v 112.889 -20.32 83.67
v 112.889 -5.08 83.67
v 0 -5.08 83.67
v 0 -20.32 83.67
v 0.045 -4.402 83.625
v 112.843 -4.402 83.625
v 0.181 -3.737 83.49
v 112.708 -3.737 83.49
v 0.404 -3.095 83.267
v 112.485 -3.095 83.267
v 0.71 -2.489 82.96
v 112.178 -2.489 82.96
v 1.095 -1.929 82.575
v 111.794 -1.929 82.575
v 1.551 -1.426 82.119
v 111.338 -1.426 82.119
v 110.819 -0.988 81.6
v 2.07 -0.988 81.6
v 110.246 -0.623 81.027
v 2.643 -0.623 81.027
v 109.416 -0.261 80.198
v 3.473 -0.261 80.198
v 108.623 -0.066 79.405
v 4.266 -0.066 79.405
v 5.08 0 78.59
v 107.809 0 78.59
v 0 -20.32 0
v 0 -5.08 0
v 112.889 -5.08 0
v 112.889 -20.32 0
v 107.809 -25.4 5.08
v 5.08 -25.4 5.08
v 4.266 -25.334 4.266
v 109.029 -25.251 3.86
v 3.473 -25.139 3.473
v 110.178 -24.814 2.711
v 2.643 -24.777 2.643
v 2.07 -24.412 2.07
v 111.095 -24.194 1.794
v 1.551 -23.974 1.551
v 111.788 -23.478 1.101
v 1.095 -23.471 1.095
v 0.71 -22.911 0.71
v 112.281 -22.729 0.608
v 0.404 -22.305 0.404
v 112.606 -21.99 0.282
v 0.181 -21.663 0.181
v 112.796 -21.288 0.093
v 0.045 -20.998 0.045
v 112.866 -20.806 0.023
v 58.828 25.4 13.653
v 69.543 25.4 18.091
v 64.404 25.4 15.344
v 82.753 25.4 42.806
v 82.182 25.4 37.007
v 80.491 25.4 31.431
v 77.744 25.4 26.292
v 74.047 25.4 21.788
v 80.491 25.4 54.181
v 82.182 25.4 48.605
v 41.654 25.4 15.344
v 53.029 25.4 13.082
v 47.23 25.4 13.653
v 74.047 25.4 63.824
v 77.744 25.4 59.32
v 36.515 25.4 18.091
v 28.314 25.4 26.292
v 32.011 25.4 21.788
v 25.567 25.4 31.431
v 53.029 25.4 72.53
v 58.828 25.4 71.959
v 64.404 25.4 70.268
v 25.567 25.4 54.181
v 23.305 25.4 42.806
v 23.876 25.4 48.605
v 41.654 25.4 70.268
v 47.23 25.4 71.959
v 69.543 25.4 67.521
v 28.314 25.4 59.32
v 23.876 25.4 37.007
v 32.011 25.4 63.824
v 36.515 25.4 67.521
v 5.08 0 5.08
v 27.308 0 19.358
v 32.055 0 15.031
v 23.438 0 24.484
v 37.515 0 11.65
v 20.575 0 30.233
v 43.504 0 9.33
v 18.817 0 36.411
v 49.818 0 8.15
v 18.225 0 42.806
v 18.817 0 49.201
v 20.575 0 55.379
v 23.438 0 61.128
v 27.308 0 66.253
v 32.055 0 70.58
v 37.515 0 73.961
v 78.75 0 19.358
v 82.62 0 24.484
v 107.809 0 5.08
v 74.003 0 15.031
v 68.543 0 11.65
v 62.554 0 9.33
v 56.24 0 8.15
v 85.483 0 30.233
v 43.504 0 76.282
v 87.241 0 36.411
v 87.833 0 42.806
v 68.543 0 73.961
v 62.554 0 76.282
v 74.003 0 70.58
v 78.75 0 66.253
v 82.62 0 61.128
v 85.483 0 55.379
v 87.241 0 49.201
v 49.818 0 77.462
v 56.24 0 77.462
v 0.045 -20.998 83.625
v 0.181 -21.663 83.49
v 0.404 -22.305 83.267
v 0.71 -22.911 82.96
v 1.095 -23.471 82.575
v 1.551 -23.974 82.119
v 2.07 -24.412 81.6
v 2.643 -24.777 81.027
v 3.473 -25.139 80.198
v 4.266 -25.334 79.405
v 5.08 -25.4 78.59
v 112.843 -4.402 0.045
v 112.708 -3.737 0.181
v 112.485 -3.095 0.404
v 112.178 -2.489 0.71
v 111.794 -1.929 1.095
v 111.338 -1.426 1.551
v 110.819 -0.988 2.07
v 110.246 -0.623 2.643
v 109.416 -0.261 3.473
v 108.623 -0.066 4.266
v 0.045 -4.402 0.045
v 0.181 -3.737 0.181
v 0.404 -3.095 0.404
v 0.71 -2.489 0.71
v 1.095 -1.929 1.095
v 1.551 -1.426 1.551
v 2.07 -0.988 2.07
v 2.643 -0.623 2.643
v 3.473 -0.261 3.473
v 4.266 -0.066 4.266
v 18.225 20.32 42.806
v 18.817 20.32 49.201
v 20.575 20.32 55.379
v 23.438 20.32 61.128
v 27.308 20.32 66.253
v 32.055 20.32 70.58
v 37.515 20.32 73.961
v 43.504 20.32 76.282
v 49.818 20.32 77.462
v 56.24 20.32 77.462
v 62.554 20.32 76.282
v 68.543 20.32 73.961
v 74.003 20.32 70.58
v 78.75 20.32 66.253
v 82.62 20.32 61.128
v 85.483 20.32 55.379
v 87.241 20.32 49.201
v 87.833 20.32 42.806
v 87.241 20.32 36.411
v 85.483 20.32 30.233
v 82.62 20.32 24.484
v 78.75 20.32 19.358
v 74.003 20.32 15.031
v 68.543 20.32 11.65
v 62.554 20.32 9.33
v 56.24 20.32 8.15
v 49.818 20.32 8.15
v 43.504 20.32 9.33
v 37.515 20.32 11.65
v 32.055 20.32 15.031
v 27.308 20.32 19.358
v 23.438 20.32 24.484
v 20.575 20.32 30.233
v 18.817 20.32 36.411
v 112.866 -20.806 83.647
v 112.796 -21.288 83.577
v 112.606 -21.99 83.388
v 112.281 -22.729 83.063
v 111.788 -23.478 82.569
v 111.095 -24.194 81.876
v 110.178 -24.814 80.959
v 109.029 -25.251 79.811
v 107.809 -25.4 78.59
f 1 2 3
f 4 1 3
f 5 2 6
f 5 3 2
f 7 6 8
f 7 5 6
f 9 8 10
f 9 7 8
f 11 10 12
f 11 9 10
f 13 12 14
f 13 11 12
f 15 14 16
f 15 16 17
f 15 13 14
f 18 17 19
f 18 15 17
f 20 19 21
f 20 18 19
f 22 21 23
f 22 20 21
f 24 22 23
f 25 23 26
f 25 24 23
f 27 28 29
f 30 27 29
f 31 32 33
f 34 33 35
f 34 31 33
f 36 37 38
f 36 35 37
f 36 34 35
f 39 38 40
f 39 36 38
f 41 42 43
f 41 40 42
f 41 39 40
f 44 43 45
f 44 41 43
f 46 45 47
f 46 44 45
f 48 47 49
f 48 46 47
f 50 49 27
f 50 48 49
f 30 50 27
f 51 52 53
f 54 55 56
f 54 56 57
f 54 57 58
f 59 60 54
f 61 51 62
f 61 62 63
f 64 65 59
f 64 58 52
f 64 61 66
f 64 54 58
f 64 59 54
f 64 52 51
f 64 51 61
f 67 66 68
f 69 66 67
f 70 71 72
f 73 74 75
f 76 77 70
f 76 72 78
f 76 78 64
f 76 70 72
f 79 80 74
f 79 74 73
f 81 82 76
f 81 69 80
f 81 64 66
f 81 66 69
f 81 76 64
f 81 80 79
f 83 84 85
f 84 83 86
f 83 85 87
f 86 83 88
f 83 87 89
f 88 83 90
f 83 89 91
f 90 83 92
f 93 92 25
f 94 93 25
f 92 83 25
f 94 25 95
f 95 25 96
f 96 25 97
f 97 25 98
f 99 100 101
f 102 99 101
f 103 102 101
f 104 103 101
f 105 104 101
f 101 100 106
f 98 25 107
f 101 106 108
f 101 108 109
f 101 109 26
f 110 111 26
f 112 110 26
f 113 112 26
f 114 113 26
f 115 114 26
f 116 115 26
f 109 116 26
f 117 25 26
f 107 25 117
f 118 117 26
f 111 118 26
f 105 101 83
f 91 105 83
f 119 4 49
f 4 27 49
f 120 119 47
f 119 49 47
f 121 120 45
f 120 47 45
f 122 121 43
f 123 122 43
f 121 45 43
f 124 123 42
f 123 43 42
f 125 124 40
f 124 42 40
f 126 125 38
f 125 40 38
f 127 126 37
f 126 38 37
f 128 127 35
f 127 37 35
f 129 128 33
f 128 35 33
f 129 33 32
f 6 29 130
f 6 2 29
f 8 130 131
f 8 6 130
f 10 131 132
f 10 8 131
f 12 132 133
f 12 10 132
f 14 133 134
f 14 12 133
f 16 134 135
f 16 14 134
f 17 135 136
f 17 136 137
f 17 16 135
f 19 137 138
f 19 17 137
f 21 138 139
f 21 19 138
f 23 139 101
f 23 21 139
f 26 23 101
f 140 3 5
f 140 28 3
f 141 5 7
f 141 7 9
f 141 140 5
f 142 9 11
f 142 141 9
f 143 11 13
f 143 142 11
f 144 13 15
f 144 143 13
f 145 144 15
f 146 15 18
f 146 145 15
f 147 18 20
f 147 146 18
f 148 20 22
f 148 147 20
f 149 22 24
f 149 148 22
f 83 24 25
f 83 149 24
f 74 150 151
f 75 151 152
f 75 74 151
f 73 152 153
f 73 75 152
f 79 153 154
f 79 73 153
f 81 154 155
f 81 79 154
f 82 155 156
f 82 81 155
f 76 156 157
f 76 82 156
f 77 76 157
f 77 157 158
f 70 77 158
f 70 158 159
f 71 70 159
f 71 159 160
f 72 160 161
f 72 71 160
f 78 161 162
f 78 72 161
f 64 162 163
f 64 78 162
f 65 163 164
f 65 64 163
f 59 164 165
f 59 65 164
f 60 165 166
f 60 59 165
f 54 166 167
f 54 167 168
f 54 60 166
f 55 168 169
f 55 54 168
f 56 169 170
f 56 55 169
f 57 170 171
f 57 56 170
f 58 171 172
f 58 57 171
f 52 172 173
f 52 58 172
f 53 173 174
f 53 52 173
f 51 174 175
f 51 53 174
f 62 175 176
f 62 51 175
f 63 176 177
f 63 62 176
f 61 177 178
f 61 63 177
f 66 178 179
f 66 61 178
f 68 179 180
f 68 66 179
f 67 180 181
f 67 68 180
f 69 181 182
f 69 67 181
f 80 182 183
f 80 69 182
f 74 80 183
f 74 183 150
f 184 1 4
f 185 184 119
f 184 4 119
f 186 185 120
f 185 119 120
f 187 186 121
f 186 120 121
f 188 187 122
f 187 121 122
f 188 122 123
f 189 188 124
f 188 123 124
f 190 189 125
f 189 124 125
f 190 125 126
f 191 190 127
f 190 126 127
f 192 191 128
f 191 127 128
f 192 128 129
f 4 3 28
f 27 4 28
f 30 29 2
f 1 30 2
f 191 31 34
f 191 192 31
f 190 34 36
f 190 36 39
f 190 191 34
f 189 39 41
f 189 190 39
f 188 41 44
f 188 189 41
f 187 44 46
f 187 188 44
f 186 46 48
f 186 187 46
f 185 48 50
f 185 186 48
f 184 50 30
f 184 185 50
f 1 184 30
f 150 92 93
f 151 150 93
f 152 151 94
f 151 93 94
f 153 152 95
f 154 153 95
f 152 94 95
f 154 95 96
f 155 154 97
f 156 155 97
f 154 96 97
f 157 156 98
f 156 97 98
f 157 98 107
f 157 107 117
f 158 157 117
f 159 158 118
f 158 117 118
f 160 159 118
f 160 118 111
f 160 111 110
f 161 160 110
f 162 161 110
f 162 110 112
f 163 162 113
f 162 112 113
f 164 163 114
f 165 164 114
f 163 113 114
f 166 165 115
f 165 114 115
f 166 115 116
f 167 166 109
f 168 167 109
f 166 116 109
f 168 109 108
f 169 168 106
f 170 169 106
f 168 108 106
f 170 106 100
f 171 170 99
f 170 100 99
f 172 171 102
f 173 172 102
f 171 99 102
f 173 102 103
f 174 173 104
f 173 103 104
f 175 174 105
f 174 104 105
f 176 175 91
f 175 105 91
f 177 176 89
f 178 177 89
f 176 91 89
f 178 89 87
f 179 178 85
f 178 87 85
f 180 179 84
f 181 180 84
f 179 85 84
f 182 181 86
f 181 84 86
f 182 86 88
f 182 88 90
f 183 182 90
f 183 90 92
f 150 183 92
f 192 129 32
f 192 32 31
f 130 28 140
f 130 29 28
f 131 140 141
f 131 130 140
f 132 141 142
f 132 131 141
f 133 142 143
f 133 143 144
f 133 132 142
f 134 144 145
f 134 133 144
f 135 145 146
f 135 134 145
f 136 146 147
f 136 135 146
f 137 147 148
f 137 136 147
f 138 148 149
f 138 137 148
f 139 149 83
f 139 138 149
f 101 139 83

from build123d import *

# Parameters (mm, degrees)
F1_DEPTH = 25.4
F2_R     = 5.08
F3_R     = 5.08
F5_R     = 34.804273
F6_DEPTH = 25.4
F7_SIZE  = 5.08


with BuildPart() as f1:
    # F0 (on Front) → F1 (new body)
    with BuildSketch(Plane.XZ):
        Polygon((0, 83.670445), (0, 0), (94.367452, 0), (112.888888, 0), (112.888888, 83.670445), align=None)
    extrude(amount=F1_DEPTH)

    # F2
    f2_edges = [f1.edges().sort_by_distance(p)[0] for p in [
        (112.888888, 0, 41.835222),
        (0, 0, 41.835222),
        (56.444444, 0, 0),
        (56.444444, 0, 83.670445),
    ]]
    fillet(f2_edges, radius=F2_R)

    # F3
    f3_edges = [f1.edges().sort_by_distance(p)[0] for p in [
        (112.888888, -25.4, 41.835222),
        (56.444444, -25.4, 83.670445),
        (0, -25.4, 41.835222),
        (56.444444, -25.4, 0),
    ]]
    fillet(f3_edges, radius=F3_R)

    # F5 (on face) → F6 (join)
    with BuildSketch(Plane(origin=(0, 0, 0), x_dir=(-1, 0, 0), z_dir=(0, 1, 0))):
        with Locations((-53.028904, 42.805873)):
            Circle(F5_R)
    extrude(amount=F6_DEPTH)

    # F7
    f7_edges = [f1.edges().sort_by_distance(p)[0] for p in [
        (87.833177, 25.4, 42.805873),
    ]]
    chamfer(f7_edges, length=F7_SIZE)


solid = f1.part
